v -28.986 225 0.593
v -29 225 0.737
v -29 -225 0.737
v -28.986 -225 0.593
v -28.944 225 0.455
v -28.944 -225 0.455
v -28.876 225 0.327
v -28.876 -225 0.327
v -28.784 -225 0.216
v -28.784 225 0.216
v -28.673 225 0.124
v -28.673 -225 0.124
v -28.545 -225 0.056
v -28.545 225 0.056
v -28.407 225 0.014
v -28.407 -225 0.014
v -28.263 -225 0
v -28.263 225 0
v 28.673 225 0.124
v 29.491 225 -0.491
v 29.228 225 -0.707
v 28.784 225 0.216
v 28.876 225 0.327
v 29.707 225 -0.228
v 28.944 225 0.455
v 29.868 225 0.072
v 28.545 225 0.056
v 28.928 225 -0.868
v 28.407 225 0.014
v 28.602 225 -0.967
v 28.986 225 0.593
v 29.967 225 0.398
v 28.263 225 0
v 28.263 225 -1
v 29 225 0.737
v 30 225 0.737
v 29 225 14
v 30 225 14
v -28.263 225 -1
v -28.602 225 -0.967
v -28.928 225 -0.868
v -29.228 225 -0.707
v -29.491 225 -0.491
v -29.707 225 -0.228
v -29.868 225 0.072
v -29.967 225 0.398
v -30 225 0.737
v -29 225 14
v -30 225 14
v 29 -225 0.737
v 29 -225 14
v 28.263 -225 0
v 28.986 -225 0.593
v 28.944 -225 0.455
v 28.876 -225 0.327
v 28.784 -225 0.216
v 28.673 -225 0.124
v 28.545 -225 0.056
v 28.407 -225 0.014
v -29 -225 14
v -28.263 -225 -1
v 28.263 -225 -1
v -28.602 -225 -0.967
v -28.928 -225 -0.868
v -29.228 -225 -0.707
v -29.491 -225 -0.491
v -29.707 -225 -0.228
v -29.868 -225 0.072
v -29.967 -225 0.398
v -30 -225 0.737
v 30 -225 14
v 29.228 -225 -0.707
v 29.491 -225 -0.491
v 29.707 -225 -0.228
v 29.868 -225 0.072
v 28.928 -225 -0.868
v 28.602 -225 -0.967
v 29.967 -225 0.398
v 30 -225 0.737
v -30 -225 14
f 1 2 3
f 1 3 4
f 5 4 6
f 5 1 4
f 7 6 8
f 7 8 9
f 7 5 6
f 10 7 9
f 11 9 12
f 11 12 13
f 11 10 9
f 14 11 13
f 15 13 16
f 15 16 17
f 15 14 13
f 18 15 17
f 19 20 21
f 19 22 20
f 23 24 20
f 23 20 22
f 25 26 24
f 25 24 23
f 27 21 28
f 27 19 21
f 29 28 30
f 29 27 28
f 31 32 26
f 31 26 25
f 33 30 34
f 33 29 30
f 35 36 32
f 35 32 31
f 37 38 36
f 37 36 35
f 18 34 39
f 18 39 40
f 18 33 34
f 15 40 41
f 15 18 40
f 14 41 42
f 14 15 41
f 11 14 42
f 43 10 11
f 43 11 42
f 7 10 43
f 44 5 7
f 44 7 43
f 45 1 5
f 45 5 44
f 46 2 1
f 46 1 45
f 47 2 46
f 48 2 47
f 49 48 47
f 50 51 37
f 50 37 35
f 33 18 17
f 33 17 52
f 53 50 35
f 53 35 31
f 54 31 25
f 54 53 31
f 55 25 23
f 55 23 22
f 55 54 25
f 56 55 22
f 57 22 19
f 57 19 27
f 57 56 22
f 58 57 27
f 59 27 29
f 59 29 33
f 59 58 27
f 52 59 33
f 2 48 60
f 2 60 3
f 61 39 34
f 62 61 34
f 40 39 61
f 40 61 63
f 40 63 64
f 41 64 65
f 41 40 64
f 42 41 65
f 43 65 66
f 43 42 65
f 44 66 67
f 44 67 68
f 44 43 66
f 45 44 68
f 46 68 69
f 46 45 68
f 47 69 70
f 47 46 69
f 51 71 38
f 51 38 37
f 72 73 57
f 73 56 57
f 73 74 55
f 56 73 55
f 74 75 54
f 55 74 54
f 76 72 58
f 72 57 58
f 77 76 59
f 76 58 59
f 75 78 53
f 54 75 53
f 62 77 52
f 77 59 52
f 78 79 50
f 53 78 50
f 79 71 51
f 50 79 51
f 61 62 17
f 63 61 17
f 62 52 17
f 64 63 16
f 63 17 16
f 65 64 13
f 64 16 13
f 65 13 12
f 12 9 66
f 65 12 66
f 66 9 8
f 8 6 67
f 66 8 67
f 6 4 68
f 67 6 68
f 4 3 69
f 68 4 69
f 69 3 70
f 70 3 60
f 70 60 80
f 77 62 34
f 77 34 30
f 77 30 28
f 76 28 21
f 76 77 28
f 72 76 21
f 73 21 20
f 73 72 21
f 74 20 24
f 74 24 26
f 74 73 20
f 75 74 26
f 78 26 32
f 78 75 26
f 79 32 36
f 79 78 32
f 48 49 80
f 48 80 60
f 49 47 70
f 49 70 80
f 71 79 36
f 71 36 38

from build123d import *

# Parameters (mm, degrees)
SKETCH1_W                      = 60
SKETCH1_H                      = 450
BASE_FLANGE1_DEPTH             = 1
EDGE_FLANGE1_STRIP_W           = 5.4732
EDGE_FLANGE1_STRIP_H           = 1
EDGE_FLANGE1_STRIP_CUT_DEPTH   = 450
EDGE_FLANGE1_STRIP_2_W         = 5.4732
EDGE_FLANGE1_STRIP_2_H         = 1
EDGE_FLANGE1_STRIP_CUT_2_DEPTH = 450
EDGE_FLANGE1_DEPTH             = 450
EDGE_FLANGE1_BEND_DEPTH        = 450


# Sheet-metal steps are written as plain solids
with BuildPart() as part:
    # Sketch1 → Base-Flange1 (new body)
    with BuildSketch(Plane.XY):
        Rectangle(SKETCH1_W, SKETCH1_H)
    extrude(amount=-BASE_FLANGE1_DEPTH)

    # Edge-Flange1 strip (across the edge) → Edge-Flange1 strip cut (cut)
    with BuildSketch(Plane(origin=(30, -225, 0), x_dir=(-1, 0, 0), z_dir=(0, 1, 0))):
        with Locations((-1, -0.5)):
            Rectangle(EDGE_FLANGE1_STRIP_W, EDGE_FLANGE1_STRIP_H)
    extrude(amount=EDGE_FLANGE1_STRIP_CUT_DEPTH, mode=Mode.SUBTRACT)

    # Edge-Flange1 strip 2 (across the edge) → Edge-Flange1 strip cut 2 (cut)
    with BuildSketch(Plane(origin=(-30, 225, 0), x_dir=(1, 0, 0), z_dir=(0, -1, 0))):
        with Locations((-1, -0.5)):
            Rectangle(EDGE_FLANGE1_STRIP_2_W, EDGE_FLANGE1_STRIP_2_H)
    extrude(amount=EDGE_FLANGE1_STRIP_CUT_2_DEPTH, mode=Mode.SUBTRACT)

    # Edge-Flange1 section (across the edge) → Edge-Flange1 (add)
    with BuildSketch(Plane(origin=(30, -225, 0), x_dir=(-1, 0, 0), z_dir=(0, 1, 0))):
        with BuildLine():
            Line((0, 0.7366), (0, 14))
            Line((0, 14), (1, 14))
            Line((1, 14), (1, 0.7366))
            ThreePointArc((1, 0.7366), (1.215745145, 0.215745145), (1.7366, 0))
            Line((1.7366, 0), (1.7366, -1))
            ThreePointArc((1.7366, -1), (0.508638364, -0.491361636), (0, 0.7366))
        make_face()
    extrude(amount=EDGE_FLANGE1_DEPTH)

    # Edge-Flange1 section 2 (across the edge) → Edge-Flange1 bend (add)
    with BuildSketch(Plane(origin=(-30, 225, 0), x_dir=(1, 0, 0), z_dir=(0, -1, 0))):
        with BuildLine():
            Line((0, 0.7366), (0, 14))
            Line((0, 14), (1, 14))
            Line((1, 14), (1, 0.7366))
            ThreePointArc((1, 0.7366), (1.215745145, 0.215745145), (1.7366, 0))
            Line((1.7366, 0), (1.7366, -1))
            ThreePointArc((1.7366, -1), (0.508638364, -0.491361636), (0, 0.7366))
        make_face()
    extrude(amount=EDGE_FLANGE1_BEND_DEPTH)


solid = part.part
